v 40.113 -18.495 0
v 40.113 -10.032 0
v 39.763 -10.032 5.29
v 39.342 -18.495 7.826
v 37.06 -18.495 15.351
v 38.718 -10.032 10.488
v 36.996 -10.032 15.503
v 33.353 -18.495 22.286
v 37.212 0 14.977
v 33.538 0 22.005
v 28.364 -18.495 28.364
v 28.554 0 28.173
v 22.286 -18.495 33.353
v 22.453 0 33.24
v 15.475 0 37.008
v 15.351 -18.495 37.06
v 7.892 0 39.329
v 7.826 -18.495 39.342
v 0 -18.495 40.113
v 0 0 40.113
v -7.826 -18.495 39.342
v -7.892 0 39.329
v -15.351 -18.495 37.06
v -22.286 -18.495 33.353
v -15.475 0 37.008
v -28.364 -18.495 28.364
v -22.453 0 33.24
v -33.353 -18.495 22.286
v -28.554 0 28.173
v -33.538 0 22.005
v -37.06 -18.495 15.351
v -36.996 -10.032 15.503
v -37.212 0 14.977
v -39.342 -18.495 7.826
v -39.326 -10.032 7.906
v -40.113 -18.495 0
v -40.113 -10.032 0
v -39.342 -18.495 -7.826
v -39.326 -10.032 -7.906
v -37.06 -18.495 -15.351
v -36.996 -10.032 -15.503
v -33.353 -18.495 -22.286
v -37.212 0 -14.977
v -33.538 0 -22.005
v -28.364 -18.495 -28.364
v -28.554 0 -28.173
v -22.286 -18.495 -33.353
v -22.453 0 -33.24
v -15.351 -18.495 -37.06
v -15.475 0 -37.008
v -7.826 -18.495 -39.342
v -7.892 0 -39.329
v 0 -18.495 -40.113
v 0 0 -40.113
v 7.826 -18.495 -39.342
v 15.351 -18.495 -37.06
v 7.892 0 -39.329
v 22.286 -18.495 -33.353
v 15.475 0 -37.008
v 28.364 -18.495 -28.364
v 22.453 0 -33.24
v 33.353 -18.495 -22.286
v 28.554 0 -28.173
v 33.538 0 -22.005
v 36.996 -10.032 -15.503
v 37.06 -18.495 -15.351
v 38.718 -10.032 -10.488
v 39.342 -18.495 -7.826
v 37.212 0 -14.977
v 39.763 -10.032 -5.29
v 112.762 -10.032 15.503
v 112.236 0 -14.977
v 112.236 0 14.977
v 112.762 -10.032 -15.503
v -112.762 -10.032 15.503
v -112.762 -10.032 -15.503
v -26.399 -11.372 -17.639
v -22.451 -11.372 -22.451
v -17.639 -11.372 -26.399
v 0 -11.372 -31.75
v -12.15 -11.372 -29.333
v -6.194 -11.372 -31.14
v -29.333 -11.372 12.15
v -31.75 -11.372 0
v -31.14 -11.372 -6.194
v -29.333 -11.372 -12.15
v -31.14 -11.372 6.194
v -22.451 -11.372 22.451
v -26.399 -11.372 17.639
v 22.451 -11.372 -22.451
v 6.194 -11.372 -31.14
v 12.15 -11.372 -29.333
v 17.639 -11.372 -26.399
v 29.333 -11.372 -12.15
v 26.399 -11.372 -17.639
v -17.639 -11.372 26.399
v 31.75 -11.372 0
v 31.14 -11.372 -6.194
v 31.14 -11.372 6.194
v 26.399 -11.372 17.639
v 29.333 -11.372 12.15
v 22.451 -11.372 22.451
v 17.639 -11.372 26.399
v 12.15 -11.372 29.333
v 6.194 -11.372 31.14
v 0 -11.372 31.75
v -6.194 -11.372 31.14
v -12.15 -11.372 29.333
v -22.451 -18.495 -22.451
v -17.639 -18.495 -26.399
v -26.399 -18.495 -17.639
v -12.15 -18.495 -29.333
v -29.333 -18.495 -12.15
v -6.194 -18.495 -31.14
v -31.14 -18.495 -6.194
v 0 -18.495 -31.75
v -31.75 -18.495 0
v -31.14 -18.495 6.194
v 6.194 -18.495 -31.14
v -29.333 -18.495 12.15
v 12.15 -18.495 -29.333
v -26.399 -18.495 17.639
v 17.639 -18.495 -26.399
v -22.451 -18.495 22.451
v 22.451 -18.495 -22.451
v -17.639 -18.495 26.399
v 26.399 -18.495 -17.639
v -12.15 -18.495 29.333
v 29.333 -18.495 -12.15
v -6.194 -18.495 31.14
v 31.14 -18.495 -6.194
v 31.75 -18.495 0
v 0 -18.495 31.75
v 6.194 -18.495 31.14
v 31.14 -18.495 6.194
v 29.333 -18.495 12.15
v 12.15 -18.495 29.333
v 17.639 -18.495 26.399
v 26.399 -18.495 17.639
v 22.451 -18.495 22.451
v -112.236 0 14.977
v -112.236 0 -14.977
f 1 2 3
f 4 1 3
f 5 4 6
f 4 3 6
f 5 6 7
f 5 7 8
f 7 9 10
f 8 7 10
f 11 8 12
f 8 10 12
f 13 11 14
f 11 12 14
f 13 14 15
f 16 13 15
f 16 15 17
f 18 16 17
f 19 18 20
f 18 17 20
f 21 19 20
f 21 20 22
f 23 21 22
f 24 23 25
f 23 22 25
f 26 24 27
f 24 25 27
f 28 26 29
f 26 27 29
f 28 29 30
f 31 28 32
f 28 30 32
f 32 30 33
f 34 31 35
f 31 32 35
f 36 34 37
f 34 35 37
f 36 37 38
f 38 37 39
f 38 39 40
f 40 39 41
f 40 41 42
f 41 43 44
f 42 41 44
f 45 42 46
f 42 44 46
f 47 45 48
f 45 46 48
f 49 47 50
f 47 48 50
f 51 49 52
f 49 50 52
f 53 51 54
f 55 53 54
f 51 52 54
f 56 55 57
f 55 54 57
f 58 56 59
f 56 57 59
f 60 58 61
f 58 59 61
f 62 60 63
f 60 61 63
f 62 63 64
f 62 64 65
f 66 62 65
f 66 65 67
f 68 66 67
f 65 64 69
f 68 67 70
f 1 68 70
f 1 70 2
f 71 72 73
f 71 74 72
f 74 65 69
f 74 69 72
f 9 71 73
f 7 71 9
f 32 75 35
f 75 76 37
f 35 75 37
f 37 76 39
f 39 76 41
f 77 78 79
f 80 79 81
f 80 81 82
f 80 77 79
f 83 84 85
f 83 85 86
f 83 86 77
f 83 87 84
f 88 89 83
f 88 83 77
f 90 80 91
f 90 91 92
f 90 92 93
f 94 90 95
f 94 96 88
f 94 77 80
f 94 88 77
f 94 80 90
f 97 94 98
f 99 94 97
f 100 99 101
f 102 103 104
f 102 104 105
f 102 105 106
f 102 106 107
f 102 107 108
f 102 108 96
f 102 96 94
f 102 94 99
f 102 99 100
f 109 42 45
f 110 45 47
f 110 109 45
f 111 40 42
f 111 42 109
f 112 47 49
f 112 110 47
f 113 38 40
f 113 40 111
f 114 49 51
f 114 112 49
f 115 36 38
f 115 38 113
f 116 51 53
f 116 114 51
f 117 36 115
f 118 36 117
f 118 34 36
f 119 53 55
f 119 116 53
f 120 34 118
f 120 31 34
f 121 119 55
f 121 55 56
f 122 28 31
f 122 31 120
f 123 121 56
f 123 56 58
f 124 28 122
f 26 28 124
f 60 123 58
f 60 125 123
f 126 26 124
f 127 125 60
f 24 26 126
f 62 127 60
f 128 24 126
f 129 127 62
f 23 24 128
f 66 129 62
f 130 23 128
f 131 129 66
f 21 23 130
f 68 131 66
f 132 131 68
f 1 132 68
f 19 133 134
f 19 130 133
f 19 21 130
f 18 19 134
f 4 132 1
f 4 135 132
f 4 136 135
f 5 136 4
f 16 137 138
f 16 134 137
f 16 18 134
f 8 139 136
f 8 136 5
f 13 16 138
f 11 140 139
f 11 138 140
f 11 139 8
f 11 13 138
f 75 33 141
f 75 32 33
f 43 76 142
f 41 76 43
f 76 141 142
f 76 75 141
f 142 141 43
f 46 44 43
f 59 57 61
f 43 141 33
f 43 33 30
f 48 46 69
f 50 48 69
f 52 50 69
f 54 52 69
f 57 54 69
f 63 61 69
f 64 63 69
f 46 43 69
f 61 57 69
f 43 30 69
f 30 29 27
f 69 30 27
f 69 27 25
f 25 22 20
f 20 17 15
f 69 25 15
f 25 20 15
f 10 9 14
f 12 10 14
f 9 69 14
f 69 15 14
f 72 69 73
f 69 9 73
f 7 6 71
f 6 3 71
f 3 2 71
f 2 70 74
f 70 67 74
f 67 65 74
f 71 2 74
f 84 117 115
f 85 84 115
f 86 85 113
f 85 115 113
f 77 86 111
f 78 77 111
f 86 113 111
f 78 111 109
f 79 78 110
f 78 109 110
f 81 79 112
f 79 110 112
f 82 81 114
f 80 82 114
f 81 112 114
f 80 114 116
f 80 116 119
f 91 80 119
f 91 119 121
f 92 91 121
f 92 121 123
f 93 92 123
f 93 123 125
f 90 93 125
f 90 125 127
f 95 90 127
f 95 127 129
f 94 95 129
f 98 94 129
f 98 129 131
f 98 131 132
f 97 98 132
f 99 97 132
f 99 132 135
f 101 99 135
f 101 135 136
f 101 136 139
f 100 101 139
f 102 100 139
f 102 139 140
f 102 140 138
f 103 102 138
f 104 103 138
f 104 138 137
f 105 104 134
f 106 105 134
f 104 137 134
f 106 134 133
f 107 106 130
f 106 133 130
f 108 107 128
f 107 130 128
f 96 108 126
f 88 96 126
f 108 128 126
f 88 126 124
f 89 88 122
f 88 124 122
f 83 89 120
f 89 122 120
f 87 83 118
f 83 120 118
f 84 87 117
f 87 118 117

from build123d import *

# Parameters (mm, degrees)
F0_R     = 32.6923124251
F1_DEPTH = 14.6508645266
F2_W     = 224.4729697704
F2_H     = 29.9537181854
F3_DEPTH = 10.0321955979
F3_TAPER = -3
F4_R     = 40.1130157543
F5_DEPTH = 18.4948313981
F7_D     = 63.5
F7_DEPTH = 50.8
F7_TIP   = 19.0773246541
F8_DEPTH = 11.372352019


with BuildPart() as f1:
    # F0 (on Front) → F1 (new body)
    with BuildSketch(Plane.XZ):
        Circle(F0_R)
    extrude(amount=F1_DEPTH)

    # F2 (on Front) → F3 (join)
    with BuildSketch(Plane.XZ):
        Rectangle(F2_W, F2_H)
    extrude(amount=F3_DEPTH, taper=F3_TAPER)

    # F4 (on Front) → F5 (join)
    with BuildSketch(Plane.XZ):
        Circle(F4_R)
    extrude(amount=F5_DEPTH)

    # F7
    with Locations(Plane(origin=(0, 0, 0), x_dir=(1, 0, 0), z_dir=(0, 1, 0))):
        with Locations((0, 0)):
            Hole(F7_D / 2, depth=F7_DEPTH)
            with Locations((0, 0, -(F7_DEPTH + F7_TIP / 2))):  # 118° drill point
                Cone(0, F7_D / 2, F7_TIP, mode=Mode.SUBTRACT)

    # F0 (on Front) → F8 (join)
    with BuildSketch(Plane.XZ):
        Circle(F0_R)
    extrude(amount=F8_DEPTH)


solid = f1.part
